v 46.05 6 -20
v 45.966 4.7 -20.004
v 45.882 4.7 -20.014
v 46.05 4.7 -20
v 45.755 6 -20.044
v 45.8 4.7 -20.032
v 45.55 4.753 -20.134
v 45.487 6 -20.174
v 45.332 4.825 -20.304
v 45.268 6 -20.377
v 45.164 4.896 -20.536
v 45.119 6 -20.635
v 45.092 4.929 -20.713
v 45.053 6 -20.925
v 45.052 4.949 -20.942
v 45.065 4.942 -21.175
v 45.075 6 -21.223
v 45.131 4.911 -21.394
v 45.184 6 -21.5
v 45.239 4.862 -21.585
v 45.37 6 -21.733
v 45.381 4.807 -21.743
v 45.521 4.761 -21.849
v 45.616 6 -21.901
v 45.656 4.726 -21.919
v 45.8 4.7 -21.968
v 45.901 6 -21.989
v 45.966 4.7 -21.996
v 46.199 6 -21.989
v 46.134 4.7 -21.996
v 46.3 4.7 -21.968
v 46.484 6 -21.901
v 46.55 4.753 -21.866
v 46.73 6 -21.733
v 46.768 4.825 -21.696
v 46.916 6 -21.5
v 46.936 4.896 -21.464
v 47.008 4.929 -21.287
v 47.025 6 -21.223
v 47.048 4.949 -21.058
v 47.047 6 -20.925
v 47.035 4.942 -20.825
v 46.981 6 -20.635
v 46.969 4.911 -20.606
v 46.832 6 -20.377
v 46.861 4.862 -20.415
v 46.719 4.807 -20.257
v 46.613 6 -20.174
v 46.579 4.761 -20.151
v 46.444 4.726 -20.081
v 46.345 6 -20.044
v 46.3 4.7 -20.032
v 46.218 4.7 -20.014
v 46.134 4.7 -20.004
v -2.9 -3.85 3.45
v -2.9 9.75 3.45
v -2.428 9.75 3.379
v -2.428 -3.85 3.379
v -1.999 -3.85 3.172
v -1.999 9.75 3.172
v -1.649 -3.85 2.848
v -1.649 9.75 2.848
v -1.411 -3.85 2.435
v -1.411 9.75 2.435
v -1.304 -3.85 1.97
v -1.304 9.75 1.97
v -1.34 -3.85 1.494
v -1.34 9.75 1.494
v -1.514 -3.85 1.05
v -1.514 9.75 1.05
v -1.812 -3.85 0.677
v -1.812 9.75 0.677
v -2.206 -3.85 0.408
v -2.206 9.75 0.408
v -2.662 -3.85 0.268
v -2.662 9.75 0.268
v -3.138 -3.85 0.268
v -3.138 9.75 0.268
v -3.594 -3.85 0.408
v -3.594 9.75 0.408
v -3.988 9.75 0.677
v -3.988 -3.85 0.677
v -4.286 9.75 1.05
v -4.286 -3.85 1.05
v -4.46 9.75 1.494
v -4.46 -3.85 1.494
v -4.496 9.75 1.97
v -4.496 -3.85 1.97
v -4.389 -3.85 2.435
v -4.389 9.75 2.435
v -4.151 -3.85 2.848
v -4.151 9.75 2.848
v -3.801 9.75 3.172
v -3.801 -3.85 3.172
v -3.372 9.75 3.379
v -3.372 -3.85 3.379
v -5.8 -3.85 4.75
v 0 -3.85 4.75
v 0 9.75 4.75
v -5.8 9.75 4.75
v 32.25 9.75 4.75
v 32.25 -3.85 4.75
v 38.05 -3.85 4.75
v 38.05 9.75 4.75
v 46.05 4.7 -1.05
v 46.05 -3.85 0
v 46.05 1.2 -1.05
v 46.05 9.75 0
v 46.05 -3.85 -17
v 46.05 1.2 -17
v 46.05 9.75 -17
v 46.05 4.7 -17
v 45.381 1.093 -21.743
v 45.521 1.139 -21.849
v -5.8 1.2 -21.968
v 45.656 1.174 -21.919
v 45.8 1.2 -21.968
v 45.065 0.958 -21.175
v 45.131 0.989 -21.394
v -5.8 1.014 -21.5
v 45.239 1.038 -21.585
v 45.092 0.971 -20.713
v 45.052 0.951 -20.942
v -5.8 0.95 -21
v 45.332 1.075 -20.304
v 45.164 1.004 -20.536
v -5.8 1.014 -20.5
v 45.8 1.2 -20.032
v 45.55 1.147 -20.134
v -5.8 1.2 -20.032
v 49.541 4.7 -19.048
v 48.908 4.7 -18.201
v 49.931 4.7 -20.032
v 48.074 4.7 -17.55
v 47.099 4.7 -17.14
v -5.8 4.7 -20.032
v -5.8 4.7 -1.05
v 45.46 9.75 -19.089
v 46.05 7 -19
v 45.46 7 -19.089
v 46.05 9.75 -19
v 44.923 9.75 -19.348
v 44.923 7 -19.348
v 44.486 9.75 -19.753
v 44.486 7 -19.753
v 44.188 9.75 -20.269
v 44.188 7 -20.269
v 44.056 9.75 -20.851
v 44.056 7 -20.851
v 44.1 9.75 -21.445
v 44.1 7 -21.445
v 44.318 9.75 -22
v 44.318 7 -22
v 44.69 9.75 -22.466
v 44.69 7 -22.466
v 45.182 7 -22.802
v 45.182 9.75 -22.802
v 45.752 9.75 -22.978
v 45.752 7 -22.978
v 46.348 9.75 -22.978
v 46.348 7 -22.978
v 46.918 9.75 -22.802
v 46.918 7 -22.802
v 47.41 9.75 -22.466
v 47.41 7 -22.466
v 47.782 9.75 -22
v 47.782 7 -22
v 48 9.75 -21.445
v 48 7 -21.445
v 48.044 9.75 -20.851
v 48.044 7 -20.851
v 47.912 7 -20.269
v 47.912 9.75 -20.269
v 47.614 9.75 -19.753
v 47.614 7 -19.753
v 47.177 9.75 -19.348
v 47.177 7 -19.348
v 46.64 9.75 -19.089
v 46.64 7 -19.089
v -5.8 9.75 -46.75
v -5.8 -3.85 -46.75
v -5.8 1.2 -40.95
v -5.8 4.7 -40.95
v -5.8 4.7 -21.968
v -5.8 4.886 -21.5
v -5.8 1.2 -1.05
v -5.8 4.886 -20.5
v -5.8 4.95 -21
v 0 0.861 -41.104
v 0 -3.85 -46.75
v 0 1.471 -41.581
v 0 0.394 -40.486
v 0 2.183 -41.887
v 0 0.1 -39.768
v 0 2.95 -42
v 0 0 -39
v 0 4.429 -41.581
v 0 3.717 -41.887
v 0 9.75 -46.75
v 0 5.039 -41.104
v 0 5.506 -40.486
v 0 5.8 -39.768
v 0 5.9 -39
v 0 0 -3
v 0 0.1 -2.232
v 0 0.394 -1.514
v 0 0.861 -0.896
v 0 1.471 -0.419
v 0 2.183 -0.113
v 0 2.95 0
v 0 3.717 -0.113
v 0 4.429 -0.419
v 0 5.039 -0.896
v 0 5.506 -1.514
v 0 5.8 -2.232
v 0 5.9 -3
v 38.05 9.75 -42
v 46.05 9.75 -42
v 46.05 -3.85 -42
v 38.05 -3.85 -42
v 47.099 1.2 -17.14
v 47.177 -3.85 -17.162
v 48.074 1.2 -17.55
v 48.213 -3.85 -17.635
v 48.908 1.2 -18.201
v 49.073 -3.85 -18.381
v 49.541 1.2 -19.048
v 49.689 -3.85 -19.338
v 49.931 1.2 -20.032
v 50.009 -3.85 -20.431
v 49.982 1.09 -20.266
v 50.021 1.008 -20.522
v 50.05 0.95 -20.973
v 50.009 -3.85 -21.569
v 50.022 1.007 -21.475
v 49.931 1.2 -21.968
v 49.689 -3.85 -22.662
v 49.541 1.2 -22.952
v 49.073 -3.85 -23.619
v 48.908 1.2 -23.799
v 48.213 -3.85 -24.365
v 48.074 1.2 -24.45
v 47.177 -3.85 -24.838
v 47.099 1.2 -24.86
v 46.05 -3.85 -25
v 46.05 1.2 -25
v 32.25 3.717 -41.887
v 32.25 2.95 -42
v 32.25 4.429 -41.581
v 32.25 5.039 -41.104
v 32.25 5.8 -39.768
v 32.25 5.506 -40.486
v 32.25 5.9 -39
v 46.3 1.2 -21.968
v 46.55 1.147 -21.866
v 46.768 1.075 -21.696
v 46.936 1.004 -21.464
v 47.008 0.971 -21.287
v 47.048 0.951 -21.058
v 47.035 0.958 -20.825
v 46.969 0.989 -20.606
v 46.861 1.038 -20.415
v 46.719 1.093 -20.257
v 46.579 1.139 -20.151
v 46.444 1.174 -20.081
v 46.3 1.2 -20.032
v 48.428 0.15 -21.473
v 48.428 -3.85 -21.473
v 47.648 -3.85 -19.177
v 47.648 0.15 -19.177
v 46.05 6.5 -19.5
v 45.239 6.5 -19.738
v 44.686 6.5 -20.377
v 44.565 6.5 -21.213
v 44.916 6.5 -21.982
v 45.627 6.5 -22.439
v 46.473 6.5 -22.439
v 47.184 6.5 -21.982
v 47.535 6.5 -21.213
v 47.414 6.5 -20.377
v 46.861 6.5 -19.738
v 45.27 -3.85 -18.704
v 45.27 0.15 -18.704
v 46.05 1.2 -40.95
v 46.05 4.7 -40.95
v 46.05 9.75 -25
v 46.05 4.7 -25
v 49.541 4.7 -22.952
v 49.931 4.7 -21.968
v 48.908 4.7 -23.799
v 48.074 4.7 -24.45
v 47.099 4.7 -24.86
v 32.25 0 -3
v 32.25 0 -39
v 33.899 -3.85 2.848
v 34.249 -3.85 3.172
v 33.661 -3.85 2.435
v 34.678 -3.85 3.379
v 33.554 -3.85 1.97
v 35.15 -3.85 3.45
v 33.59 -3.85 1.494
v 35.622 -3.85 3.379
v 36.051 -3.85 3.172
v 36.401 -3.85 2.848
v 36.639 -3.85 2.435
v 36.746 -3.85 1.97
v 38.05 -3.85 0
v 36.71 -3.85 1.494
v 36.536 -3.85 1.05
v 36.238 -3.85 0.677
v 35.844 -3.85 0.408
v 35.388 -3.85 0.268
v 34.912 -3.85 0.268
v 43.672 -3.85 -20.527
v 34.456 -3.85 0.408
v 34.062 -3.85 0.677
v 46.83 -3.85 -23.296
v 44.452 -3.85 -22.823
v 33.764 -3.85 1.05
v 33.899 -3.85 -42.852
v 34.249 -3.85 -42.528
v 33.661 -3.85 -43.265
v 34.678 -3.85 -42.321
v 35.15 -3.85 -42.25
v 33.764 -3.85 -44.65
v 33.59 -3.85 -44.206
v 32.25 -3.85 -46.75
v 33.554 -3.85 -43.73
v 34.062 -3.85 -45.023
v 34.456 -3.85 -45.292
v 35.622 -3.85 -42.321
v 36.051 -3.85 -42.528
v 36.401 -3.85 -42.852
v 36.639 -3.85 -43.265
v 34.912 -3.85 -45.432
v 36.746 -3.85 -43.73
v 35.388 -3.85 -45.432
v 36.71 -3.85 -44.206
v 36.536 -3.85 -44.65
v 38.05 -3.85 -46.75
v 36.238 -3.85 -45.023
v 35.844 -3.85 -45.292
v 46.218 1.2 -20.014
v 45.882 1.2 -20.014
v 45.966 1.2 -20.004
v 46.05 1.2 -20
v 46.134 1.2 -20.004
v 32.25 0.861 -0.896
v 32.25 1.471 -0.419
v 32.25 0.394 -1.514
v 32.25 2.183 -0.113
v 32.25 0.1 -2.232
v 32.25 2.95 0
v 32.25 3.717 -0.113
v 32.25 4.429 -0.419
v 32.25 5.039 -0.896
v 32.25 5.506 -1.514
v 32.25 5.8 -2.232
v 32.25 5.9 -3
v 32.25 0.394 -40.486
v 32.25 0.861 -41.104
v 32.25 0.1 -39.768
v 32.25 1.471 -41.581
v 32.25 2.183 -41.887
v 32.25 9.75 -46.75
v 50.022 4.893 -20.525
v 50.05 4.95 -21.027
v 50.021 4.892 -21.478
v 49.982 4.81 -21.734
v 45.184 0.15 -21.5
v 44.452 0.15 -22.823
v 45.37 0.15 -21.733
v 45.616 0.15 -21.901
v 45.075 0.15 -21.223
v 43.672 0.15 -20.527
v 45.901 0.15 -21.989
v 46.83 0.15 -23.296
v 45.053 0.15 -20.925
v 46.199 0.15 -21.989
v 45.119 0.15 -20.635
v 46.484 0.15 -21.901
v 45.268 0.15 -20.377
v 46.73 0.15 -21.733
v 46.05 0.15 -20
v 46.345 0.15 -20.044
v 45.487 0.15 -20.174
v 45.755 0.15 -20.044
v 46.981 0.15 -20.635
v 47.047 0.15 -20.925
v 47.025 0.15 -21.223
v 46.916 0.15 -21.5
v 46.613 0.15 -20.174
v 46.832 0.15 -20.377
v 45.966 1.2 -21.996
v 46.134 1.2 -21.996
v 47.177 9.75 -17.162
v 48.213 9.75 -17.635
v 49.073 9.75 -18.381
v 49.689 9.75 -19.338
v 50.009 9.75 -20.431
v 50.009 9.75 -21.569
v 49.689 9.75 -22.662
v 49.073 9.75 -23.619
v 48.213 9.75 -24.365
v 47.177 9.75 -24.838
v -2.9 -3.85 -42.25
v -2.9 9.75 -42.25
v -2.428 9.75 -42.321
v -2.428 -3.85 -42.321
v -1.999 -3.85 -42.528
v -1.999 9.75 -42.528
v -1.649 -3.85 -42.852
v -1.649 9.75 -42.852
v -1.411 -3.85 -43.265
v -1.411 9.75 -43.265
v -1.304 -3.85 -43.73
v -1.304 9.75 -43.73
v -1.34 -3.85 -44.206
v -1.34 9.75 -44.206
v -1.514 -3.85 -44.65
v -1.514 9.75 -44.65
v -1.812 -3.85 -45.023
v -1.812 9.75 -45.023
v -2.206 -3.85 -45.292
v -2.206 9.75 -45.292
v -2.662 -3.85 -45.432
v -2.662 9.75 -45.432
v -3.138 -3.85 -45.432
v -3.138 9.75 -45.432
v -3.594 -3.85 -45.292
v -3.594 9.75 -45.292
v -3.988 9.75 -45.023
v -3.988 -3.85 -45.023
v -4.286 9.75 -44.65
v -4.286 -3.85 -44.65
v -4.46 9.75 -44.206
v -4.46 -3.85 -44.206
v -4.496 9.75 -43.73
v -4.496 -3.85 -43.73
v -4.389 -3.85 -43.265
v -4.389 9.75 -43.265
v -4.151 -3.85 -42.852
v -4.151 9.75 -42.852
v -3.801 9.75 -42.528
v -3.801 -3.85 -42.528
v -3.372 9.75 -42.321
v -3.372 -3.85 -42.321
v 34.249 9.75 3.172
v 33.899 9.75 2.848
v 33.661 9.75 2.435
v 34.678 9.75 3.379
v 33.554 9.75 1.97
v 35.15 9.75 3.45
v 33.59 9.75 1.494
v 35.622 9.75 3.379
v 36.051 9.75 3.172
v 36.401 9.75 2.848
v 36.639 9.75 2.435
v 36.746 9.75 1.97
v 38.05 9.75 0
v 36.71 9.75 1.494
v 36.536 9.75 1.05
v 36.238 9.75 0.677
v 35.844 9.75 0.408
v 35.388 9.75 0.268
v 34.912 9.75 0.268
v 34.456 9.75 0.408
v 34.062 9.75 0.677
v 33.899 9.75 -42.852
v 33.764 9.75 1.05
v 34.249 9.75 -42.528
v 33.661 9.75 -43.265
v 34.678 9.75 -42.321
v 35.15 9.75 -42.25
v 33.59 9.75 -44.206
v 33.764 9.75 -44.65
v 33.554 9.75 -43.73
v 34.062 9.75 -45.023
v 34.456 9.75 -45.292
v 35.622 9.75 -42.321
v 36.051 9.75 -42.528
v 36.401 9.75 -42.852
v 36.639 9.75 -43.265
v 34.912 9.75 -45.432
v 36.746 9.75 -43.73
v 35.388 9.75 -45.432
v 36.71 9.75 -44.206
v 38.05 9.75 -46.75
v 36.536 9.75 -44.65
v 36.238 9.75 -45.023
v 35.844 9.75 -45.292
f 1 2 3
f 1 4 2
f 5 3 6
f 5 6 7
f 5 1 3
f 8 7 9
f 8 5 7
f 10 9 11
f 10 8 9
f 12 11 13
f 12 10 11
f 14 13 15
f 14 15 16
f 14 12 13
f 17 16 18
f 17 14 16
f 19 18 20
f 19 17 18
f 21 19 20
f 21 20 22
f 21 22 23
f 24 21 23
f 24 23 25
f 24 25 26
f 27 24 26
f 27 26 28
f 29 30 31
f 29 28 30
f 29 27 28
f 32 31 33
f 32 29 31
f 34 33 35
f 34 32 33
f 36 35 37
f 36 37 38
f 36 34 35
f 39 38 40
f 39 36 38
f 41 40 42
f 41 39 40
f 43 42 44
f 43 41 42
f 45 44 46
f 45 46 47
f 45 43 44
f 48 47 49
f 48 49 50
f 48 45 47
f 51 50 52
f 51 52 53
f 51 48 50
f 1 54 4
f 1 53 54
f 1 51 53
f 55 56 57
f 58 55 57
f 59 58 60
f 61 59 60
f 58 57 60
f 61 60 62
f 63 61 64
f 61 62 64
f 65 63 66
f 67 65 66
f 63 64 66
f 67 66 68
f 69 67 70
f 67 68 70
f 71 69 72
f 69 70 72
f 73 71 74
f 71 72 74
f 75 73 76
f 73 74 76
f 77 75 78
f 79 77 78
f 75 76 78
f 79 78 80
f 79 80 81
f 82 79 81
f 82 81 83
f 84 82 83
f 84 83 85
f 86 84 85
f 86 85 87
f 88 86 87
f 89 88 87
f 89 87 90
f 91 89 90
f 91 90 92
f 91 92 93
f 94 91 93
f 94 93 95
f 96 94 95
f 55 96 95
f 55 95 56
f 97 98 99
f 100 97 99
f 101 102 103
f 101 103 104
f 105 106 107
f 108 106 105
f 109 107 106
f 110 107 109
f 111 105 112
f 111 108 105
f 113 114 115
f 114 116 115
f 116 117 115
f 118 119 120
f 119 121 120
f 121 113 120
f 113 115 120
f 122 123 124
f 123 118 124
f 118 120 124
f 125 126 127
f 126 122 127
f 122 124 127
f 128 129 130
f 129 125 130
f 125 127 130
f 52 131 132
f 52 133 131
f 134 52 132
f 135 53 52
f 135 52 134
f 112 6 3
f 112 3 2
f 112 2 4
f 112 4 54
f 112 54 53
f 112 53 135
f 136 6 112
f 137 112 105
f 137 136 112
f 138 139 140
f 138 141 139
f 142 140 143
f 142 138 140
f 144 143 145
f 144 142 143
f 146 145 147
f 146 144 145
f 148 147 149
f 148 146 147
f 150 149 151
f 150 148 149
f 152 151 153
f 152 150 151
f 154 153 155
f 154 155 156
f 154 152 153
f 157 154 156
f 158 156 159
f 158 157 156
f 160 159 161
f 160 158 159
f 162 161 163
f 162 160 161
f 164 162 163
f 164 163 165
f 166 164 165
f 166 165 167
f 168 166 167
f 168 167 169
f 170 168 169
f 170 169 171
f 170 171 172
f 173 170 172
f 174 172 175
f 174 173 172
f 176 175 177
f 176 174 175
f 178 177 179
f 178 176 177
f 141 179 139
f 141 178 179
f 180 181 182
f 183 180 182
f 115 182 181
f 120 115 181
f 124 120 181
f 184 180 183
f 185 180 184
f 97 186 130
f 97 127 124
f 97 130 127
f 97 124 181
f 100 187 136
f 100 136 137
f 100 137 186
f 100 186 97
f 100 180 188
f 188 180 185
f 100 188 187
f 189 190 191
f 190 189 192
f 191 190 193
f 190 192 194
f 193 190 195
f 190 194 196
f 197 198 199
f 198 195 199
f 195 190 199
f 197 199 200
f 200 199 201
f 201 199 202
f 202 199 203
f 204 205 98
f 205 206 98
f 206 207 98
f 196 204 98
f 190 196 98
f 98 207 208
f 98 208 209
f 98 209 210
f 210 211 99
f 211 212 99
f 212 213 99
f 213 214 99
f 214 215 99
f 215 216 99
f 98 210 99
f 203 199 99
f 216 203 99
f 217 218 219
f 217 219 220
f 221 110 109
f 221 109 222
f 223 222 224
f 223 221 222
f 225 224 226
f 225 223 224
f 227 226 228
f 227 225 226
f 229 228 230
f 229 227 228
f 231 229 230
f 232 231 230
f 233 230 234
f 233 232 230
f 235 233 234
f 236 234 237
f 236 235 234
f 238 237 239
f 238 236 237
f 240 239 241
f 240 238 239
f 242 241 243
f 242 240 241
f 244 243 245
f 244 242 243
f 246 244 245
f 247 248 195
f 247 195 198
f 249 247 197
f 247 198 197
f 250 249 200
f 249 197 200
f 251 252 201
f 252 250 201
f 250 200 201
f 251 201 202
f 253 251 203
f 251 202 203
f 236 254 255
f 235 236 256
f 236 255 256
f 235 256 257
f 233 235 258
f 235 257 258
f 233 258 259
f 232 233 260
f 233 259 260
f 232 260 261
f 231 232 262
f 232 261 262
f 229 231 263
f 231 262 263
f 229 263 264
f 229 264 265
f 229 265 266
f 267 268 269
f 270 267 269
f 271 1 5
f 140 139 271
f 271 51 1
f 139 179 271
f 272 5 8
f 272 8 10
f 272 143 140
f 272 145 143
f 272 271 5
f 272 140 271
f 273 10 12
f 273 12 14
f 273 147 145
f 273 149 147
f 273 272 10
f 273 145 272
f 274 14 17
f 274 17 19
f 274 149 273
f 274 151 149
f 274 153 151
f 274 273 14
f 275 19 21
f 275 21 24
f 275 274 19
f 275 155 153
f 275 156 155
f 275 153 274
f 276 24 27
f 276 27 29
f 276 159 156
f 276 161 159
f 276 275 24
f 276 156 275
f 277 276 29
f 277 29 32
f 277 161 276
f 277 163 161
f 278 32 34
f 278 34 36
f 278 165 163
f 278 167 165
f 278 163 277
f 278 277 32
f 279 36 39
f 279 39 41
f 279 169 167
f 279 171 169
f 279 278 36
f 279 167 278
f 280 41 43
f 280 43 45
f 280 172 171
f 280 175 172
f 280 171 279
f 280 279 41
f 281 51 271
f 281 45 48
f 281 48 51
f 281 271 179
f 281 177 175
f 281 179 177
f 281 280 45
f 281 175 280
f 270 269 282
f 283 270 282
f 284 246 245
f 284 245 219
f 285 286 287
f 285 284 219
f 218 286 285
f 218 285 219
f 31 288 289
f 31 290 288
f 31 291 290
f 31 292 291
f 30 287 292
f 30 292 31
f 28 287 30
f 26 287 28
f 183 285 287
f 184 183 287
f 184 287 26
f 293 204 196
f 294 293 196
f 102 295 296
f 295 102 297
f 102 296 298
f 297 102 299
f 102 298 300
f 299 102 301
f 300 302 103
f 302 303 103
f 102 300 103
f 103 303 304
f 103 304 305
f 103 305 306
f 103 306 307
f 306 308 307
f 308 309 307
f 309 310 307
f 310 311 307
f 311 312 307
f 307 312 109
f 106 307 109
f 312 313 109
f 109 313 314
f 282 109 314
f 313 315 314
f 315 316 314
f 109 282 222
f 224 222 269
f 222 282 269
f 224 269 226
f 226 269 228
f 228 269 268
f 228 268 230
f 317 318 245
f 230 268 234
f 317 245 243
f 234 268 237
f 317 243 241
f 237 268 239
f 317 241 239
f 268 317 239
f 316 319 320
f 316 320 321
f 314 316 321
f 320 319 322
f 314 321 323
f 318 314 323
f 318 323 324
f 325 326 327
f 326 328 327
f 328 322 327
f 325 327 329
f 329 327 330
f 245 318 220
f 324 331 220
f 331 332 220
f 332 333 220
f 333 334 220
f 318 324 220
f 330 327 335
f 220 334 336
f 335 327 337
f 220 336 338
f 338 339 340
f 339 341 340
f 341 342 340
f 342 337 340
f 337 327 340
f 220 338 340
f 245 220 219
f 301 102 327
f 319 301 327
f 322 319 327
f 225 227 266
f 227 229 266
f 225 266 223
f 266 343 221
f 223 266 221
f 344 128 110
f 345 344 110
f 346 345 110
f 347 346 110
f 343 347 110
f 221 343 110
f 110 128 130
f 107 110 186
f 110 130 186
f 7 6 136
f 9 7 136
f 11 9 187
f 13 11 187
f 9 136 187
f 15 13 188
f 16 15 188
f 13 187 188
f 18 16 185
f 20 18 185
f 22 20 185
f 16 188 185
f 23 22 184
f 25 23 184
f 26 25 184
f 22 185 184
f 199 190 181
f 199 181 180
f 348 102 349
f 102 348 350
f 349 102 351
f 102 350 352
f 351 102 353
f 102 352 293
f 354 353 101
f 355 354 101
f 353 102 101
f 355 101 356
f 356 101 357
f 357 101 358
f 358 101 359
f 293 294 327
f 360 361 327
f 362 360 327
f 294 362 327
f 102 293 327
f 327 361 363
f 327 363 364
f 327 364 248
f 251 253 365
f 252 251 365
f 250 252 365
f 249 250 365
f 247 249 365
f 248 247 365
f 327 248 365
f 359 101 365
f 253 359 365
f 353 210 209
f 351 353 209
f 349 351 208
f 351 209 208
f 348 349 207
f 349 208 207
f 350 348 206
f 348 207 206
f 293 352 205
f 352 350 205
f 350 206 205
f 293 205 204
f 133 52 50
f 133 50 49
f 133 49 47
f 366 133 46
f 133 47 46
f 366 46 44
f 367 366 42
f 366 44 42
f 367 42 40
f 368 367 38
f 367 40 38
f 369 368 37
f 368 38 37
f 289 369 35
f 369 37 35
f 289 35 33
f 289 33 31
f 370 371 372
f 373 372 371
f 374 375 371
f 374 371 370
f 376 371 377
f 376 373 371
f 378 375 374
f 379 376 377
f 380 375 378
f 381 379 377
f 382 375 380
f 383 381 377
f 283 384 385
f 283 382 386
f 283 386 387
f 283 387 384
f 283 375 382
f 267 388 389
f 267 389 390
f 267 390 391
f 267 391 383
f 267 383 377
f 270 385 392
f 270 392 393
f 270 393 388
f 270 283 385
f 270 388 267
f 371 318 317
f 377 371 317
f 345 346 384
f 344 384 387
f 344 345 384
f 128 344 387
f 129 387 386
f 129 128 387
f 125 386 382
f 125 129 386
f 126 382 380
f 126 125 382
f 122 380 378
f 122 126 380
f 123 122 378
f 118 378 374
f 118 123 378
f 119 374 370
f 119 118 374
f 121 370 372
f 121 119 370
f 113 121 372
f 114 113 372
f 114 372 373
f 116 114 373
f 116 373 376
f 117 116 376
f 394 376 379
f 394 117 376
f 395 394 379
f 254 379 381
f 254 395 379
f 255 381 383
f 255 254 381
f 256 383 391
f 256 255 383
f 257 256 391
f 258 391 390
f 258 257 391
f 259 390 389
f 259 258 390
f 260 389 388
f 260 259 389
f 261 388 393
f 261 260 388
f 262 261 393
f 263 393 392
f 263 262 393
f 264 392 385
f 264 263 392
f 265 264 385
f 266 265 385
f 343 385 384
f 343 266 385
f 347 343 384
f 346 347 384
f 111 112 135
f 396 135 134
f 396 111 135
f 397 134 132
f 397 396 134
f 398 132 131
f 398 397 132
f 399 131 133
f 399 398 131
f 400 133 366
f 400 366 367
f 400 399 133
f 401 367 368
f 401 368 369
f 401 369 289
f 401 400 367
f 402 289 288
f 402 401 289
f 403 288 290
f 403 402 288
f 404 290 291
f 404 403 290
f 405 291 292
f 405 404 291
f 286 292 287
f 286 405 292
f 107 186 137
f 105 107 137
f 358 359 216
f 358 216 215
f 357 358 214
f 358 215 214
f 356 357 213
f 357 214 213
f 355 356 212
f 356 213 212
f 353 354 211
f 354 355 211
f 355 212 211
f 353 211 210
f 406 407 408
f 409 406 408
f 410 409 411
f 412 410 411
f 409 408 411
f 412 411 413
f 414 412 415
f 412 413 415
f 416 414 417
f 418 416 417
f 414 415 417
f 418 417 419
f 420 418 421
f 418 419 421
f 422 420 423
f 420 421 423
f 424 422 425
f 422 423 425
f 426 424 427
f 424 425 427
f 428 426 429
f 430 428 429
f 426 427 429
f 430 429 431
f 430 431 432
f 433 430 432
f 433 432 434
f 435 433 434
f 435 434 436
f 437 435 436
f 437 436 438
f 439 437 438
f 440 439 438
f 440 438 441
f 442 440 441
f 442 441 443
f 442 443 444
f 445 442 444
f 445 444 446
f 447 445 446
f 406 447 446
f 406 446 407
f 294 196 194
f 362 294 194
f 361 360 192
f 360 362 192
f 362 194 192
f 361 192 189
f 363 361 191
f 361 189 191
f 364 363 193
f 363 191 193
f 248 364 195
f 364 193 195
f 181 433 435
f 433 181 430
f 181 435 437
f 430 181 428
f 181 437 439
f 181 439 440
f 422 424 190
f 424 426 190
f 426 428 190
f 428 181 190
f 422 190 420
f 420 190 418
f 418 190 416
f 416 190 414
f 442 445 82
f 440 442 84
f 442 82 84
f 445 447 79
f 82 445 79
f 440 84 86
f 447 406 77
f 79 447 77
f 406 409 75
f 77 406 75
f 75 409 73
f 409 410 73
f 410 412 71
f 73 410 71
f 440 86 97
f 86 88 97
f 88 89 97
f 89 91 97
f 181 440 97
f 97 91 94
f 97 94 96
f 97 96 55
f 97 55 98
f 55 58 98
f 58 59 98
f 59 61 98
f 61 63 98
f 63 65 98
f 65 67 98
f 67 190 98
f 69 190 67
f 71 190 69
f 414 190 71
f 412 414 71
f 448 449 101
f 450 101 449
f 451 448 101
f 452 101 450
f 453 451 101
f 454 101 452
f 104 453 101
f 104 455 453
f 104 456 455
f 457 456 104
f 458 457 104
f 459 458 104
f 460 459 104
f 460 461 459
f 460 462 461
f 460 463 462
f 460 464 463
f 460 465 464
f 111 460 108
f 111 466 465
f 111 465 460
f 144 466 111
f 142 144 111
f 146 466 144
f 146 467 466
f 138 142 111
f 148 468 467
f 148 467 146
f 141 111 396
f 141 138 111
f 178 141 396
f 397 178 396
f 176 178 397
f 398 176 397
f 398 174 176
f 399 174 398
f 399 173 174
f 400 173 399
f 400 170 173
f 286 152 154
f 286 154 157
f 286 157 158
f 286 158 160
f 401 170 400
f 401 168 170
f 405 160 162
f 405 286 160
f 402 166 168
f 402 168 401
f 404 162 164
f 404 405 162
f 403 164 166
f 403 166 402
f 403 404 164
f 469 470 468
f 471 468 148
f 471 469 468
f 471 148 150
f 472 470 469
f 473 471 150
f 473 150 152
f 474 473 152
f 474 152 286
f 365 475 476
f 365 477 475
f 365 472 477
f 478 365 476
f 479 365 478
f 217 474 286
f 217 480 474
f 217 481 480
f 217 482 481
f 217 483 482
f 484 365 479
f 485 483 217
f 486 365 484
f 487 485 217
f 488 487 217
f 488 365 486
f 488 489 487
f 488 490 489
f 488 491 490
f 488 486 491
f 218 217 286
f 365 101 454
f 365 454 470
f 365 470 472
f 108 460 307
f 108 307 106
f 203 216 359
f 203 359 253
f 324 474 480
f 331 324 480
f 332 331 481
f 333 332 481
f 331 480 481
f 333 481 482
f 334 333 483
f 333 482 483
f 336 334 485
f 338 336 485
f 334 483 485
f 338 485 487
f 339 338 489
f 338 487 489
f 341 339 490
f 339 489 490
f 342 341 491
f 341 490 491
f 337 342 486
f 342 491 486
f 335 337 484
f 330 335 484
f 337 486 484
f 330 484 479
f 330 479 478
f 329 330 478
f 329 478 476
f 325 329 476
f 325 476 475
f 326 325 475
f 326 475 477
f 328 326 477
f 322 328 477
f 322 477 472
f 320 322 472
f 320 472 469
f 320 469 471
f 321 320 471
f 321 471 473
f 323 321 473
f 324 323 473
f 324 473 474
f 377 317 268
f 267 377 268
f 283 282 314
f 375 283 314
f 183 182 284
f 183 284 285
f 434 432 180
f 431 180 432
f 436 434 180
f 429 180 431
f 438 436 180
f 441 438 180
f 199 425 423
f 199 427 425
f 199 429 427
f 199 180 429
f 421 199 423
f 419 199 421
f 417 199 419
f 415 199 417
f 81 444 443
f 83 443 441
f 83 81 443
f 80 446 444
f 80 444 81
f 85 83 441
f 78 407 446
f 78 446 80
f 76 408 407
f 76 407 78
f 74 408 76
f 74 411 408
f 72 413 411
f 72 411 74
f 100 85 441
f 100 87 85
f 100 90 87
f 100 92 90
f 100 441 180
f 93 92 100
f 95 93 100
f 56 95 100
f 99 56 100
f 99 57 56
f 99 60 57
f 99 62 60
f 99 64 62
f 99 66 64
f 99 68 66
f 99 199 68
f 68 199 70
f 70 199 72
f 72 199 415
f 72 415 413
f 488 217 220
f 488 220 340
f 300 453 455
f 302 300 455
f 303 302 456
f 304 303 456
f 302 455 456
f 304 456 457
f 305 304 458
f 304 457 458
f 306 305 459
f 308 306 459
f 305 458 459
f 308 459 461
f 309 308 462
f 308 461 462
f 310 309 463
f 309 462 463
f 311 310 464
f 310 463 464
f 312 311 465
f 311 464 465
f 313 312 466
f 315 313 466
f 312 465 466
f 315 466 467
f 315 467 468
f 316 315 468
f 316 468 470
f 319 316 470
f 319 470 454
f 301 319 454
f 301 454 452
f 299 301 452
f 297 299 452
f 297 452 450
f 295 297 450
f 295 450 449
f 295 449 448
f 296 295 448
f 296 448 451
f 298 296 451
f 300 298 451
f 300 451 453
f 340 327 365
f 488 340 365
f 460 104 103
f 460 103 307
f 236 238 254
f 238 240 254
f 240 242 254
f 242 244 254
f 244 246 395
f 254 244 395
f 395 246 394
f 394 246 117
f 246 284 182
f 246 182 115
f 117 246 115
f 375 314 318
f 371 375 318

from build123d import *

# Parameters (mm, degrees)
SKETCH1_W           = 42
SKETCH1_H           = 5.9
SKETCH1_W_2         = 39.9
SKETCH1_H_2         = 3.5
BOSS_EXTRUDE1_DEPTH = 32.25
FILLET2_R           = 3
SKETCH2_W           = 51.5
SKETCH2_H           = 13.6
SKETCH2_W_2         = 39.9
SKETCH2_H_2         = 3.5
BOSS_EXTRUDE2_DEPTH = 5.8
SKETCH3_W           = 51.5
SKETCH3_H           = 13.6
SKETCH3_W_2         = 39.9
SKETCH3_H_2         = 3.5
BOSS_EXTRUDE3_DEPTH = 5.8
SKETCH4_R           = 1.6
CUT_EXTRUDE1_DEPTH  = 62.792596644
BOSS_EXTRUDE4_DEPTH = 13.6
CUT_EXTRUDE4_DEPTH  = 4
SKETCH15_W          = 39.9
SKETCH15_H          = 3.5
CUT_EXTRUDE5_DEPTH  = 74.483654645
SKETCH17_R          = 2
CUT_EXTRUDE6_DEPTH  = 74.483654645


with BuildPart() as part:
    # Sketch1 → Boss-Extrude1 (new body)
    with BuildSketch(Plane(origin=(0, 0, 0), x_dir=(0, 0, -1), z_dir=(1, 0, 0))):
        with Locations((21, 2.95)):
            Rectangle(SKETCH1_W, SKETCH1_H)
        with Locations((21, 2.95)):
            Rectangle(SKETCH1_W_2, SKETCH1_H_2, mode=Mode.SUBTRACT)
    extrude(amount=BOSS_EXTRUDE1_DEPTH)

    # Fillet2
    # the kernel refuses this fillet: 3 mm, written as the material it takes off along each edge
    with BuildSketch(Plane(origin=(-7.5, 0, -42), x_dir=(0, 0, 1), z_dir=(1, 0, 0)), Plane(origin=(-7.5, 5.9, 0), x_dir=(0, 0, -1), z_dir=(1, 0, 0)), Plane(origin=(-7.5, 5.9, -42), x_dir=(0, -1, 0), z_dir=(1, 0, 0))) as fillet2_piece_1:
        with BuildLine():
            CenterArc((FILLET2_R, -FILLET2_R), FILLET2_R, 90, 90)
            Line((0, -FILLET2_R), (0, 0))
            Line((0, 0), (FILLET2_R, 0))
        make_face()
    extrude(amount=47.25, mode=Mode.SUBTRACT)
    with BuildSketch(Plane(origin=(-7.5, 0, 0), x_dir=(0, 0, -1), z_dir=(1, 0, 0))) as fillet2_piece_2:
        with BuildLine():
            CenterArc((FILLET2_R, FILLET2_R), FILLET2_R, 180, 90)
            Line((0, FILLET2_R), (0, 0))
            Line((0, 0), (FILLET2_R, 0))
        make_face()
    extrude(amount=47.25, mode=Mode.SUBTRACT)

    # Sketch2 → Boss-Extrude2 (add)
    with BuildSketch(Plane(origin=(32.25, 0, 0), x_dir=(0, 0, -1), z_dir=(1, 0, 0))):
        with Locations((21, 2.95)):
            Rectangle(SKETCH2_W, SKETCH2_H)
        with Locations((21, 2.95)):
            Rectangle(SKETCH2_W_2, SKETCH2_H_2, mode=Mode.SUBTRACT)
    extrude(amount=BOSS_EXTRUDE2_DEPTH)

    # Sketch3 → Boss-Extrude3 (add)
    with BuildSketch(Plane.ZY):
        with Locations((-21, 2.95)):
            Rectangle(SKETCH3_W, SKETCH3_H)
        with Locations((-21, 2.95)):
            Rectangle(SKETCH3_W_2, SKETCH3_H_2, mode=Mode.SUBTRACT)
    extrude(amount=BOSS_EXTRUDE3_DEPTH)

    # Sketch4 → Cut-Extrude1 (cut, through all)
    with BuildSketch(Plane(origin=(0, 9.75, 0), x_dir=(1, 0, 0), z_dir=(0, 1, 0))):
        with Locations(Location((-2.9, 43.85, 0), (0, 0, 270))):
            Circle(SKETCH4_R)
        with Locations(Location((35.15, 43.85, 0), (0, 0, 270))):
            Circle(SKETCH4_R)
        with Locations(Location((-2.9, -1.85, 0), (0, 0, 270))):
            Circle(SKETCH4_R)
        with Locations(Location((35.15, -1.85, 0), (0, 0, 270))):
            Circle(SKETCH4_R)
    extrude(amount=-CUT_EXTRUDE1_DEPTH, mode=Mode.SUBTRACT)

    # Sketch8 → Boss-Extrude4 (add)
    with BuildSketch(Plane(origin=(0, 9.75, 0), x_dir=(1, 0, 0), z_dir=(0, 1, 0))):
        with BuildLine():
            ThreePointArc((46.05, 17), (50.05, 21), (46.05, 25))
            Line((46.05, 25), (46.05, 41.999583304))
            Line((46.05, 41.999583304), (38.05, 41.999583304))
            Line((38.05, 41.999583304), (38.05, 0.000416696))
            Line((38.05, 0.000416696), (46.05, 0.000416696))
            Line((46.05, 0.000416696), (46.05, 17))
        make_face()
    extrude(amount=-BOSS_EXTRUDE4_DEPTH)

    # Sketch13 → CSK for M2 Flat Head Machine Screw1 (revolve, cut)
    with BuildSketch(Plane(origin=(46.05, 9.75, -21), x_dir=(0, 0, 1), z_dir=(1, 0, 0))):
        Polygon((0, 0), (0, 13.6), (1, 13.6), (1, 3.75), (2, 2.75), (2, 0), align=None)
    revolve(axis=Axis((46.05, 16.1, -21), (0, -1, 0)), mode=Mode.SUBTRACT)

    # Sketch14 → Cut-Extrude4 (cut)
    with BuildSketch(Plane.XZ.offset(3.85)):
        Polygon((43.671623782, -20.5274256), (44.451550455, -22.823447025), (46.829926673, -23.296021425), (48.428376218, -21.4725744), (47.648449545, -19.176552975), (45.270073327, -18.703978575), align=None)
    extrude(amount=-CUT_EXTRUDE4_DEPTH, mode=Mode.SUBTRACT)

    # Sketch15 → Cut-Extrude5 (cut, through all)
    with BuildSketch(Plane.ZY.offset(5.8)):
        with Locations((-21, 2.95)):
            Rectangle(SKETCH15_W, SKETCH15_H)
    extrude(amount=-CUT_EXTRUDE5_DEPTH, mode=Mode.SUBTRACT)

    # Sketch17 → Cut-Extrude6 (cut, through all)
    with BuildSketch(Plane.ZY.offset(5.8)):
        with Locations((-21, 2.95)):
            Circle(SKETCH17_R)
    extrude(amount=-CUT_EXTRUDE6_DEPTH, mode=Mode.SUBTRACT)


solid = part.part
